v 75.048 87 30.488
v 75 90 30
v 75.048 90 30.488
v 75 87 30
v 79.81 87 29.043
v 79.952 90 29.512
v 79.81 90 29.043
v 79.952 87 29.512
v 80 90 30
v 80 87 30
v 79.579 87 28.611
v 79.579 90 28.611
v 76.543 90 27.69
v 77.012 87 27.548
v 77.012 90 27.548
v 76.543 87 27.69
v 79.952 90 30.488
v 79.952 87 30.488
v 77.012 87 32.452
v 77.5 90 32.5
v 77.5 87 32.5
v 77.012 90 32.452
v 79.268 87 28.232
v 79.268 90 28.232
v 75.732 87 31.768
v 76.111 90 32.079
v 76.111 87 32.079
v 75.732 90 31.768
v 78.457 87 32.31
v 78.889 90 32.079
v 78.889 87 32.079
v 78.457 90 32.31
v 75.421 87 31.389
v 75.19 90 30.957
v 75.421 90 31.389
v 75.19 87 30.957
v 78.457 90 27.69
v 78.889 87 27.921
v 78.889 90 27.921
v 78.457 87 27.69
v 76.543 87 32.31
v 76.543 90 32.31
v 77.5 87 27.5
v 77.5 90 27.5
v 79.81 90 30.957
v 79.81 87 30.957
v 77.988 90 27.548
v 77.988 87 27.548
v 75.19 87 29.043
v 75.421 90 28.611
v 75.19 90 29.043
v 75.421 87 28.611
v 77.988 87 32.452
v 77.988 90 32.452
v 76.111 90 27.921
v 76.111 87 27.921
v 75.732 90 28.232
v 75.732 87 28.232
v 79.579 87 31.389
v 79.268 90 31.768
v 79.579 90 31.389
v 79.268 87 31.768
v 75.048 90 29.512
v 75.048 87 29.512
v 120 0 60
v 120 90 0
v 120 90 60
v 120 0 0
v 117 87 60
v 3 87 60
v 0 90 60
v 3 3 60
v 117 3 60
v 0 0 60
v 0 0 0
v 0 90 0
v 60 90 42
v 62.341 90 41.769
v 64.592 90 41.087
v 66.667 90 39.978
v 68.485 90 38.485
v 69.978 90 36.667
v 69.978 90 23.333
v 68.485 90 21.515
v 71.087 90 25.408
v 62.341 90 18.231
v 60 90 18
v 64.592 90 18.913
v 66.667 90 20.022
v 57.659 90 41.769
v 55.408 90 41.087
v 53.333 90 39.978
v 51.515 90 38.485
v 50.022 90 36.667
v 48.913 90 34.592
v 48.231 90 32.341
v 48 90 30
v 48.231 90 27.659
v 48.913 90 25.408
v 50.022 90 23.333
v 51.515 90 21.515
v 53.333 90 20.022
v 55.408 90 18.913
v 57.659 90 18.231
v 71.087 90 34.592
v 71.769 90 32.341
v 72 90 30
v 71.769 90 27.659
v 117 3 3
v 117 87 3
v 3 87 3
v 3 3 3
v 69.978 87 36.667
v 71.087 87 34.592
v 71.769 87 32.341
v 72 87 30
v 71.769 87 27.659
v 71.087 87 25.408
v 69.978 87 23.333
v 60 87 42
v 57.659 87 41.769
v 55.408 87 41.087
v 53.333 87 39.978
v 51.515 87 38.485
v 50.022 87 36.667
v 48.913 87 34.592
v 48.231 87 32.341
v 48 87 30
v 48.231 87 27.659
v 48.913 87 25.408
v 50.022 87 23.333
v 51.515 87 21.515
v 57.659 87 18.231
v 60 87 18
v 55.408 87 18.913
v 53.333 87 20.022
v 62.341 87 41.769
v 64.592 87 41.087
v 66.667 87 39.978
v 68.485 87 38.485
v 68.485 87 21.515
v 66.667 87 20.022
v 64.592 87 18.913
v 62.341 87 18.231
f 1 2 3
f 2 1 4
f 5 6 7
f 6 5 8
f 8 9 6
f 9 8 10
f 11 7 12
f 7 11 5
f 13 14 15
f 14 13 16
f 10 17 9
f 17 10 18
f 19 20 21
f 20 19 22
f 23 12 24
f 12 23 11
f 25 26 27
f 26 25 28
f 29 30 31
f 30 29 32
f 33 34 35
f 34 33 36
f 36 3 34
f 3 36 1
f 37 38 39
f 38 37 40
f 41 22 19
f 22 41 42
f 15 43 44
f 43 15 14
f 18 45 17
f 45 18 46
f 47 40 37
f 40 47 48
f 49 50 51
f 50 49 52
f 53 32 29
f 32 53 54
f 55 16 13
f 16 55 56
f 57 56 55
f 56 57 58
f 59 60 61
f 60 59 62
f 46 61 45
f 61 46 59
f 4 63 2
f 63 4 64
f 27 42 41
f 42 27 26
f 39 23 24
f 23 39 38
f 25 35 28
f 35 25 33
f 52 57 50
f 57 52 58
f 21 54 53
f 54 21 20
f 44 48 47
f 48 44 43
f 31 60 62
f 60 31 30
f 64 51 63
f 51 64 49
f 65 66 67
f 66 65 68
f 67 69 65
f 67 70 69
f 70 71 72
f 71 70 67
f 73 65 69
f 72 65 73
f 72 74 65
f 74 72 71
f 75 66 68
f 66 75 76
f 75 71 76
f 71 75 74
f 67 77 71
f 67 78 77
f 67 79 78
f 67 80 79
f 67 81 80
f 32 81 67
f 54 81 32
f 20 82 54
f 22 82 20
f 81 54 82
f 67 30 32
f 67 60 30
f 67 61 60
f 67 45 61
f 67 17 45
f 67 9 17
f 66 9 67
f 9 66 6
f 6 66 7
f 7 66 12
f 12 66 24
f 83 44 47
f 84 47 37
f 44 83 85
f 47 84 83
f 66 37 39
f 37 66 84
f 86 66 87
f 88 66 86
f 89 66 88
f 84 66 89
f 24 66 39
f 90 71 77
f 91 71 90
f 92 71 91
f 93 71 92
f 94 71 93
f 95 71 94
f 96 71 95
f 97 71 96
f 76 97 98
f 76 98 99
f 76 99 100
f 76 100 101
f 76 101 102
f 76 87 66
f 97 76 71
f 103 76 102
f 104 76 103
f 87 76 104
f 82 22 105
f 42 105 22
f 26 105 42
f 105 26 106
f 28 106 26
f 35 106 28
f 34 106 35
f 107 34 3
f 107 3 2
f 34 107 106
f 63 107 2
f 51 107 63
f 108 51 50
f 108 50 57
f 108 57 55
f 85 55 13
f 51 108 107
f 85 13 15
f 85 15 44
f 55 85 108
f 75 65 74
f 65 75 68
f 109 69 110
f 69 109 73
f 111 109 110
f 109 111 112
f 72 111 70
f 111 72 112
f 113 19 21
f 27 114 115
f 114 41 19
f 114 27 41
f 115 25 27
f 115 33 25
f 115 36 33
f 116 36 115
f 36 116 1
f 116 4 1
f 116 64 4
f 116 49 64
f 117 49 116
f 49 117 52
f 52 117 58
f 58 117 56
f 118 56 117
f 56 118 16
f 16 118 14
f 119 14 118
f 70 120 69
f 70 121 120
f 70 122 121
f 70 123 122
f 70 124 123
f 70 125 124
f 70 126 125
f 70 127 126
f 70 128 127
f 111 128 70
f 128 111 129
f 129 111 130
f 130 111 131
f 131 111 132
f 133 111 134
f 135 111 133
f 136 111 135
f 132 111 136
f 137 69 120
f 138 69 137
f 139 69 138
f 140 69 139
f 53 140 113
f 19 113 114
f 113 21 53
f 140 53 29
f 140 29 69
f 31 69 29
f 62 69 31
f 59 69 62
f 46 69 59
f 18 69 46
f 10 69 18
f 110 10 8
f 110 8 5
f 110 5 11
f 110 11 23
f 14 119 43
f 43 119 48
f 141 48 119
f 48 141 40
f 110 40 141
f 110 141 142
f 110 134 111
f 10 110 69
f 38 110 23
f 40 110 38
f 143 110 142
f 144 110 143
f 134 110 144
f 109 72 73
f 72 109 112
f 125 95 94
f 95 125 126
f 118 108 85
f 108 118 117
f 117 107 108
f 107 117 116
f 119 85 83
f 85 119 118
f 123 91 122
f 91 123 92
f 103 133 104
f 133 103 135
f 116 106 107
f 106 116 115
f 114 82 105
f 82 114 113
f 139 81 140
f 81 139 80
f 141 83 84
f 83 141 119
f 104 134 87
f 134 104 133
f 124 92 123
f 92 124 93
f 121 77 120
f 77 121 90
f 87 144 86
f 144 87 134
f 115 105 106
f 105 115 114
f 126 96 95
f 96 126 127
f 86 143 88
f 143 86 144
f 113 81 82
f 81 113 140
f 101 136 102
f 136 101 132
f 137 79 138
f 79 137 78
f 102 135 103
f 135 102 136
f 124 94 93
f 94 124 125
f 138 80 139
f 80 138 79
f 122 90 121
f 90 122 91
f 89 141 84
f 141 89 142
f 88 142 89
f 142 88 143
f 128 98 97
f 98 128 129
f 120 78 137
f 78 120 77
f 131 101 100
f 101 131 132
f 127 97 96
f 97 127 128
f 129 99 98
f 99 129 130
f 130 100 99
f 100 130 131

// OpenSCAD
$fn = 32;

// ----------------------------------------------------------------------
// Vent box: roundvent enclosure
// ----------------------------------------------------------------------

// --- parameters (mm) ---
box_l = 120;              // box length, X
box_w = 90;               // box width, Y
box_h = 60;               // box height, Z
wall_t = 3;               // shell wall thickness
vent_d = 24;              // central vent diameter
ring_d = 5;               // ring hole diameter
n_ring = 6;               // holes in the ring
ring_r = 17.5;            // ring radius
fit_tol = 0.02;           // tolerance for press fits, mm
free_tol = 0.2;           // tolerance for clearance fits, mm

ring_step = 360 / n_ring;  // ring hole angular step

difference() {
  cube([box_l, box_w, box_h]);
  translate([wall_t, wall_t, wall_t])
    cube([box_l - 2 * wall_t, box_w - 2 * wall_t, box_h]);
  translate([box_l / 2, box_w - wall_t - 1, box_h / 2])
    rotate([-90, 0, 0]) cylinder(h = wall_t + 2, d = vent_d);
  for (i = [0 : n_ring - 1])
    translate([box_l / 2, box_w - wall_t - 1, box_h / 2])
      rotate([0, 0, i * ring_step])
        translate([ring_r, 0, 0]) rotate([-90, 0, 0])
          cylinder(h = wall_t + 2, d = ring_d);
}
